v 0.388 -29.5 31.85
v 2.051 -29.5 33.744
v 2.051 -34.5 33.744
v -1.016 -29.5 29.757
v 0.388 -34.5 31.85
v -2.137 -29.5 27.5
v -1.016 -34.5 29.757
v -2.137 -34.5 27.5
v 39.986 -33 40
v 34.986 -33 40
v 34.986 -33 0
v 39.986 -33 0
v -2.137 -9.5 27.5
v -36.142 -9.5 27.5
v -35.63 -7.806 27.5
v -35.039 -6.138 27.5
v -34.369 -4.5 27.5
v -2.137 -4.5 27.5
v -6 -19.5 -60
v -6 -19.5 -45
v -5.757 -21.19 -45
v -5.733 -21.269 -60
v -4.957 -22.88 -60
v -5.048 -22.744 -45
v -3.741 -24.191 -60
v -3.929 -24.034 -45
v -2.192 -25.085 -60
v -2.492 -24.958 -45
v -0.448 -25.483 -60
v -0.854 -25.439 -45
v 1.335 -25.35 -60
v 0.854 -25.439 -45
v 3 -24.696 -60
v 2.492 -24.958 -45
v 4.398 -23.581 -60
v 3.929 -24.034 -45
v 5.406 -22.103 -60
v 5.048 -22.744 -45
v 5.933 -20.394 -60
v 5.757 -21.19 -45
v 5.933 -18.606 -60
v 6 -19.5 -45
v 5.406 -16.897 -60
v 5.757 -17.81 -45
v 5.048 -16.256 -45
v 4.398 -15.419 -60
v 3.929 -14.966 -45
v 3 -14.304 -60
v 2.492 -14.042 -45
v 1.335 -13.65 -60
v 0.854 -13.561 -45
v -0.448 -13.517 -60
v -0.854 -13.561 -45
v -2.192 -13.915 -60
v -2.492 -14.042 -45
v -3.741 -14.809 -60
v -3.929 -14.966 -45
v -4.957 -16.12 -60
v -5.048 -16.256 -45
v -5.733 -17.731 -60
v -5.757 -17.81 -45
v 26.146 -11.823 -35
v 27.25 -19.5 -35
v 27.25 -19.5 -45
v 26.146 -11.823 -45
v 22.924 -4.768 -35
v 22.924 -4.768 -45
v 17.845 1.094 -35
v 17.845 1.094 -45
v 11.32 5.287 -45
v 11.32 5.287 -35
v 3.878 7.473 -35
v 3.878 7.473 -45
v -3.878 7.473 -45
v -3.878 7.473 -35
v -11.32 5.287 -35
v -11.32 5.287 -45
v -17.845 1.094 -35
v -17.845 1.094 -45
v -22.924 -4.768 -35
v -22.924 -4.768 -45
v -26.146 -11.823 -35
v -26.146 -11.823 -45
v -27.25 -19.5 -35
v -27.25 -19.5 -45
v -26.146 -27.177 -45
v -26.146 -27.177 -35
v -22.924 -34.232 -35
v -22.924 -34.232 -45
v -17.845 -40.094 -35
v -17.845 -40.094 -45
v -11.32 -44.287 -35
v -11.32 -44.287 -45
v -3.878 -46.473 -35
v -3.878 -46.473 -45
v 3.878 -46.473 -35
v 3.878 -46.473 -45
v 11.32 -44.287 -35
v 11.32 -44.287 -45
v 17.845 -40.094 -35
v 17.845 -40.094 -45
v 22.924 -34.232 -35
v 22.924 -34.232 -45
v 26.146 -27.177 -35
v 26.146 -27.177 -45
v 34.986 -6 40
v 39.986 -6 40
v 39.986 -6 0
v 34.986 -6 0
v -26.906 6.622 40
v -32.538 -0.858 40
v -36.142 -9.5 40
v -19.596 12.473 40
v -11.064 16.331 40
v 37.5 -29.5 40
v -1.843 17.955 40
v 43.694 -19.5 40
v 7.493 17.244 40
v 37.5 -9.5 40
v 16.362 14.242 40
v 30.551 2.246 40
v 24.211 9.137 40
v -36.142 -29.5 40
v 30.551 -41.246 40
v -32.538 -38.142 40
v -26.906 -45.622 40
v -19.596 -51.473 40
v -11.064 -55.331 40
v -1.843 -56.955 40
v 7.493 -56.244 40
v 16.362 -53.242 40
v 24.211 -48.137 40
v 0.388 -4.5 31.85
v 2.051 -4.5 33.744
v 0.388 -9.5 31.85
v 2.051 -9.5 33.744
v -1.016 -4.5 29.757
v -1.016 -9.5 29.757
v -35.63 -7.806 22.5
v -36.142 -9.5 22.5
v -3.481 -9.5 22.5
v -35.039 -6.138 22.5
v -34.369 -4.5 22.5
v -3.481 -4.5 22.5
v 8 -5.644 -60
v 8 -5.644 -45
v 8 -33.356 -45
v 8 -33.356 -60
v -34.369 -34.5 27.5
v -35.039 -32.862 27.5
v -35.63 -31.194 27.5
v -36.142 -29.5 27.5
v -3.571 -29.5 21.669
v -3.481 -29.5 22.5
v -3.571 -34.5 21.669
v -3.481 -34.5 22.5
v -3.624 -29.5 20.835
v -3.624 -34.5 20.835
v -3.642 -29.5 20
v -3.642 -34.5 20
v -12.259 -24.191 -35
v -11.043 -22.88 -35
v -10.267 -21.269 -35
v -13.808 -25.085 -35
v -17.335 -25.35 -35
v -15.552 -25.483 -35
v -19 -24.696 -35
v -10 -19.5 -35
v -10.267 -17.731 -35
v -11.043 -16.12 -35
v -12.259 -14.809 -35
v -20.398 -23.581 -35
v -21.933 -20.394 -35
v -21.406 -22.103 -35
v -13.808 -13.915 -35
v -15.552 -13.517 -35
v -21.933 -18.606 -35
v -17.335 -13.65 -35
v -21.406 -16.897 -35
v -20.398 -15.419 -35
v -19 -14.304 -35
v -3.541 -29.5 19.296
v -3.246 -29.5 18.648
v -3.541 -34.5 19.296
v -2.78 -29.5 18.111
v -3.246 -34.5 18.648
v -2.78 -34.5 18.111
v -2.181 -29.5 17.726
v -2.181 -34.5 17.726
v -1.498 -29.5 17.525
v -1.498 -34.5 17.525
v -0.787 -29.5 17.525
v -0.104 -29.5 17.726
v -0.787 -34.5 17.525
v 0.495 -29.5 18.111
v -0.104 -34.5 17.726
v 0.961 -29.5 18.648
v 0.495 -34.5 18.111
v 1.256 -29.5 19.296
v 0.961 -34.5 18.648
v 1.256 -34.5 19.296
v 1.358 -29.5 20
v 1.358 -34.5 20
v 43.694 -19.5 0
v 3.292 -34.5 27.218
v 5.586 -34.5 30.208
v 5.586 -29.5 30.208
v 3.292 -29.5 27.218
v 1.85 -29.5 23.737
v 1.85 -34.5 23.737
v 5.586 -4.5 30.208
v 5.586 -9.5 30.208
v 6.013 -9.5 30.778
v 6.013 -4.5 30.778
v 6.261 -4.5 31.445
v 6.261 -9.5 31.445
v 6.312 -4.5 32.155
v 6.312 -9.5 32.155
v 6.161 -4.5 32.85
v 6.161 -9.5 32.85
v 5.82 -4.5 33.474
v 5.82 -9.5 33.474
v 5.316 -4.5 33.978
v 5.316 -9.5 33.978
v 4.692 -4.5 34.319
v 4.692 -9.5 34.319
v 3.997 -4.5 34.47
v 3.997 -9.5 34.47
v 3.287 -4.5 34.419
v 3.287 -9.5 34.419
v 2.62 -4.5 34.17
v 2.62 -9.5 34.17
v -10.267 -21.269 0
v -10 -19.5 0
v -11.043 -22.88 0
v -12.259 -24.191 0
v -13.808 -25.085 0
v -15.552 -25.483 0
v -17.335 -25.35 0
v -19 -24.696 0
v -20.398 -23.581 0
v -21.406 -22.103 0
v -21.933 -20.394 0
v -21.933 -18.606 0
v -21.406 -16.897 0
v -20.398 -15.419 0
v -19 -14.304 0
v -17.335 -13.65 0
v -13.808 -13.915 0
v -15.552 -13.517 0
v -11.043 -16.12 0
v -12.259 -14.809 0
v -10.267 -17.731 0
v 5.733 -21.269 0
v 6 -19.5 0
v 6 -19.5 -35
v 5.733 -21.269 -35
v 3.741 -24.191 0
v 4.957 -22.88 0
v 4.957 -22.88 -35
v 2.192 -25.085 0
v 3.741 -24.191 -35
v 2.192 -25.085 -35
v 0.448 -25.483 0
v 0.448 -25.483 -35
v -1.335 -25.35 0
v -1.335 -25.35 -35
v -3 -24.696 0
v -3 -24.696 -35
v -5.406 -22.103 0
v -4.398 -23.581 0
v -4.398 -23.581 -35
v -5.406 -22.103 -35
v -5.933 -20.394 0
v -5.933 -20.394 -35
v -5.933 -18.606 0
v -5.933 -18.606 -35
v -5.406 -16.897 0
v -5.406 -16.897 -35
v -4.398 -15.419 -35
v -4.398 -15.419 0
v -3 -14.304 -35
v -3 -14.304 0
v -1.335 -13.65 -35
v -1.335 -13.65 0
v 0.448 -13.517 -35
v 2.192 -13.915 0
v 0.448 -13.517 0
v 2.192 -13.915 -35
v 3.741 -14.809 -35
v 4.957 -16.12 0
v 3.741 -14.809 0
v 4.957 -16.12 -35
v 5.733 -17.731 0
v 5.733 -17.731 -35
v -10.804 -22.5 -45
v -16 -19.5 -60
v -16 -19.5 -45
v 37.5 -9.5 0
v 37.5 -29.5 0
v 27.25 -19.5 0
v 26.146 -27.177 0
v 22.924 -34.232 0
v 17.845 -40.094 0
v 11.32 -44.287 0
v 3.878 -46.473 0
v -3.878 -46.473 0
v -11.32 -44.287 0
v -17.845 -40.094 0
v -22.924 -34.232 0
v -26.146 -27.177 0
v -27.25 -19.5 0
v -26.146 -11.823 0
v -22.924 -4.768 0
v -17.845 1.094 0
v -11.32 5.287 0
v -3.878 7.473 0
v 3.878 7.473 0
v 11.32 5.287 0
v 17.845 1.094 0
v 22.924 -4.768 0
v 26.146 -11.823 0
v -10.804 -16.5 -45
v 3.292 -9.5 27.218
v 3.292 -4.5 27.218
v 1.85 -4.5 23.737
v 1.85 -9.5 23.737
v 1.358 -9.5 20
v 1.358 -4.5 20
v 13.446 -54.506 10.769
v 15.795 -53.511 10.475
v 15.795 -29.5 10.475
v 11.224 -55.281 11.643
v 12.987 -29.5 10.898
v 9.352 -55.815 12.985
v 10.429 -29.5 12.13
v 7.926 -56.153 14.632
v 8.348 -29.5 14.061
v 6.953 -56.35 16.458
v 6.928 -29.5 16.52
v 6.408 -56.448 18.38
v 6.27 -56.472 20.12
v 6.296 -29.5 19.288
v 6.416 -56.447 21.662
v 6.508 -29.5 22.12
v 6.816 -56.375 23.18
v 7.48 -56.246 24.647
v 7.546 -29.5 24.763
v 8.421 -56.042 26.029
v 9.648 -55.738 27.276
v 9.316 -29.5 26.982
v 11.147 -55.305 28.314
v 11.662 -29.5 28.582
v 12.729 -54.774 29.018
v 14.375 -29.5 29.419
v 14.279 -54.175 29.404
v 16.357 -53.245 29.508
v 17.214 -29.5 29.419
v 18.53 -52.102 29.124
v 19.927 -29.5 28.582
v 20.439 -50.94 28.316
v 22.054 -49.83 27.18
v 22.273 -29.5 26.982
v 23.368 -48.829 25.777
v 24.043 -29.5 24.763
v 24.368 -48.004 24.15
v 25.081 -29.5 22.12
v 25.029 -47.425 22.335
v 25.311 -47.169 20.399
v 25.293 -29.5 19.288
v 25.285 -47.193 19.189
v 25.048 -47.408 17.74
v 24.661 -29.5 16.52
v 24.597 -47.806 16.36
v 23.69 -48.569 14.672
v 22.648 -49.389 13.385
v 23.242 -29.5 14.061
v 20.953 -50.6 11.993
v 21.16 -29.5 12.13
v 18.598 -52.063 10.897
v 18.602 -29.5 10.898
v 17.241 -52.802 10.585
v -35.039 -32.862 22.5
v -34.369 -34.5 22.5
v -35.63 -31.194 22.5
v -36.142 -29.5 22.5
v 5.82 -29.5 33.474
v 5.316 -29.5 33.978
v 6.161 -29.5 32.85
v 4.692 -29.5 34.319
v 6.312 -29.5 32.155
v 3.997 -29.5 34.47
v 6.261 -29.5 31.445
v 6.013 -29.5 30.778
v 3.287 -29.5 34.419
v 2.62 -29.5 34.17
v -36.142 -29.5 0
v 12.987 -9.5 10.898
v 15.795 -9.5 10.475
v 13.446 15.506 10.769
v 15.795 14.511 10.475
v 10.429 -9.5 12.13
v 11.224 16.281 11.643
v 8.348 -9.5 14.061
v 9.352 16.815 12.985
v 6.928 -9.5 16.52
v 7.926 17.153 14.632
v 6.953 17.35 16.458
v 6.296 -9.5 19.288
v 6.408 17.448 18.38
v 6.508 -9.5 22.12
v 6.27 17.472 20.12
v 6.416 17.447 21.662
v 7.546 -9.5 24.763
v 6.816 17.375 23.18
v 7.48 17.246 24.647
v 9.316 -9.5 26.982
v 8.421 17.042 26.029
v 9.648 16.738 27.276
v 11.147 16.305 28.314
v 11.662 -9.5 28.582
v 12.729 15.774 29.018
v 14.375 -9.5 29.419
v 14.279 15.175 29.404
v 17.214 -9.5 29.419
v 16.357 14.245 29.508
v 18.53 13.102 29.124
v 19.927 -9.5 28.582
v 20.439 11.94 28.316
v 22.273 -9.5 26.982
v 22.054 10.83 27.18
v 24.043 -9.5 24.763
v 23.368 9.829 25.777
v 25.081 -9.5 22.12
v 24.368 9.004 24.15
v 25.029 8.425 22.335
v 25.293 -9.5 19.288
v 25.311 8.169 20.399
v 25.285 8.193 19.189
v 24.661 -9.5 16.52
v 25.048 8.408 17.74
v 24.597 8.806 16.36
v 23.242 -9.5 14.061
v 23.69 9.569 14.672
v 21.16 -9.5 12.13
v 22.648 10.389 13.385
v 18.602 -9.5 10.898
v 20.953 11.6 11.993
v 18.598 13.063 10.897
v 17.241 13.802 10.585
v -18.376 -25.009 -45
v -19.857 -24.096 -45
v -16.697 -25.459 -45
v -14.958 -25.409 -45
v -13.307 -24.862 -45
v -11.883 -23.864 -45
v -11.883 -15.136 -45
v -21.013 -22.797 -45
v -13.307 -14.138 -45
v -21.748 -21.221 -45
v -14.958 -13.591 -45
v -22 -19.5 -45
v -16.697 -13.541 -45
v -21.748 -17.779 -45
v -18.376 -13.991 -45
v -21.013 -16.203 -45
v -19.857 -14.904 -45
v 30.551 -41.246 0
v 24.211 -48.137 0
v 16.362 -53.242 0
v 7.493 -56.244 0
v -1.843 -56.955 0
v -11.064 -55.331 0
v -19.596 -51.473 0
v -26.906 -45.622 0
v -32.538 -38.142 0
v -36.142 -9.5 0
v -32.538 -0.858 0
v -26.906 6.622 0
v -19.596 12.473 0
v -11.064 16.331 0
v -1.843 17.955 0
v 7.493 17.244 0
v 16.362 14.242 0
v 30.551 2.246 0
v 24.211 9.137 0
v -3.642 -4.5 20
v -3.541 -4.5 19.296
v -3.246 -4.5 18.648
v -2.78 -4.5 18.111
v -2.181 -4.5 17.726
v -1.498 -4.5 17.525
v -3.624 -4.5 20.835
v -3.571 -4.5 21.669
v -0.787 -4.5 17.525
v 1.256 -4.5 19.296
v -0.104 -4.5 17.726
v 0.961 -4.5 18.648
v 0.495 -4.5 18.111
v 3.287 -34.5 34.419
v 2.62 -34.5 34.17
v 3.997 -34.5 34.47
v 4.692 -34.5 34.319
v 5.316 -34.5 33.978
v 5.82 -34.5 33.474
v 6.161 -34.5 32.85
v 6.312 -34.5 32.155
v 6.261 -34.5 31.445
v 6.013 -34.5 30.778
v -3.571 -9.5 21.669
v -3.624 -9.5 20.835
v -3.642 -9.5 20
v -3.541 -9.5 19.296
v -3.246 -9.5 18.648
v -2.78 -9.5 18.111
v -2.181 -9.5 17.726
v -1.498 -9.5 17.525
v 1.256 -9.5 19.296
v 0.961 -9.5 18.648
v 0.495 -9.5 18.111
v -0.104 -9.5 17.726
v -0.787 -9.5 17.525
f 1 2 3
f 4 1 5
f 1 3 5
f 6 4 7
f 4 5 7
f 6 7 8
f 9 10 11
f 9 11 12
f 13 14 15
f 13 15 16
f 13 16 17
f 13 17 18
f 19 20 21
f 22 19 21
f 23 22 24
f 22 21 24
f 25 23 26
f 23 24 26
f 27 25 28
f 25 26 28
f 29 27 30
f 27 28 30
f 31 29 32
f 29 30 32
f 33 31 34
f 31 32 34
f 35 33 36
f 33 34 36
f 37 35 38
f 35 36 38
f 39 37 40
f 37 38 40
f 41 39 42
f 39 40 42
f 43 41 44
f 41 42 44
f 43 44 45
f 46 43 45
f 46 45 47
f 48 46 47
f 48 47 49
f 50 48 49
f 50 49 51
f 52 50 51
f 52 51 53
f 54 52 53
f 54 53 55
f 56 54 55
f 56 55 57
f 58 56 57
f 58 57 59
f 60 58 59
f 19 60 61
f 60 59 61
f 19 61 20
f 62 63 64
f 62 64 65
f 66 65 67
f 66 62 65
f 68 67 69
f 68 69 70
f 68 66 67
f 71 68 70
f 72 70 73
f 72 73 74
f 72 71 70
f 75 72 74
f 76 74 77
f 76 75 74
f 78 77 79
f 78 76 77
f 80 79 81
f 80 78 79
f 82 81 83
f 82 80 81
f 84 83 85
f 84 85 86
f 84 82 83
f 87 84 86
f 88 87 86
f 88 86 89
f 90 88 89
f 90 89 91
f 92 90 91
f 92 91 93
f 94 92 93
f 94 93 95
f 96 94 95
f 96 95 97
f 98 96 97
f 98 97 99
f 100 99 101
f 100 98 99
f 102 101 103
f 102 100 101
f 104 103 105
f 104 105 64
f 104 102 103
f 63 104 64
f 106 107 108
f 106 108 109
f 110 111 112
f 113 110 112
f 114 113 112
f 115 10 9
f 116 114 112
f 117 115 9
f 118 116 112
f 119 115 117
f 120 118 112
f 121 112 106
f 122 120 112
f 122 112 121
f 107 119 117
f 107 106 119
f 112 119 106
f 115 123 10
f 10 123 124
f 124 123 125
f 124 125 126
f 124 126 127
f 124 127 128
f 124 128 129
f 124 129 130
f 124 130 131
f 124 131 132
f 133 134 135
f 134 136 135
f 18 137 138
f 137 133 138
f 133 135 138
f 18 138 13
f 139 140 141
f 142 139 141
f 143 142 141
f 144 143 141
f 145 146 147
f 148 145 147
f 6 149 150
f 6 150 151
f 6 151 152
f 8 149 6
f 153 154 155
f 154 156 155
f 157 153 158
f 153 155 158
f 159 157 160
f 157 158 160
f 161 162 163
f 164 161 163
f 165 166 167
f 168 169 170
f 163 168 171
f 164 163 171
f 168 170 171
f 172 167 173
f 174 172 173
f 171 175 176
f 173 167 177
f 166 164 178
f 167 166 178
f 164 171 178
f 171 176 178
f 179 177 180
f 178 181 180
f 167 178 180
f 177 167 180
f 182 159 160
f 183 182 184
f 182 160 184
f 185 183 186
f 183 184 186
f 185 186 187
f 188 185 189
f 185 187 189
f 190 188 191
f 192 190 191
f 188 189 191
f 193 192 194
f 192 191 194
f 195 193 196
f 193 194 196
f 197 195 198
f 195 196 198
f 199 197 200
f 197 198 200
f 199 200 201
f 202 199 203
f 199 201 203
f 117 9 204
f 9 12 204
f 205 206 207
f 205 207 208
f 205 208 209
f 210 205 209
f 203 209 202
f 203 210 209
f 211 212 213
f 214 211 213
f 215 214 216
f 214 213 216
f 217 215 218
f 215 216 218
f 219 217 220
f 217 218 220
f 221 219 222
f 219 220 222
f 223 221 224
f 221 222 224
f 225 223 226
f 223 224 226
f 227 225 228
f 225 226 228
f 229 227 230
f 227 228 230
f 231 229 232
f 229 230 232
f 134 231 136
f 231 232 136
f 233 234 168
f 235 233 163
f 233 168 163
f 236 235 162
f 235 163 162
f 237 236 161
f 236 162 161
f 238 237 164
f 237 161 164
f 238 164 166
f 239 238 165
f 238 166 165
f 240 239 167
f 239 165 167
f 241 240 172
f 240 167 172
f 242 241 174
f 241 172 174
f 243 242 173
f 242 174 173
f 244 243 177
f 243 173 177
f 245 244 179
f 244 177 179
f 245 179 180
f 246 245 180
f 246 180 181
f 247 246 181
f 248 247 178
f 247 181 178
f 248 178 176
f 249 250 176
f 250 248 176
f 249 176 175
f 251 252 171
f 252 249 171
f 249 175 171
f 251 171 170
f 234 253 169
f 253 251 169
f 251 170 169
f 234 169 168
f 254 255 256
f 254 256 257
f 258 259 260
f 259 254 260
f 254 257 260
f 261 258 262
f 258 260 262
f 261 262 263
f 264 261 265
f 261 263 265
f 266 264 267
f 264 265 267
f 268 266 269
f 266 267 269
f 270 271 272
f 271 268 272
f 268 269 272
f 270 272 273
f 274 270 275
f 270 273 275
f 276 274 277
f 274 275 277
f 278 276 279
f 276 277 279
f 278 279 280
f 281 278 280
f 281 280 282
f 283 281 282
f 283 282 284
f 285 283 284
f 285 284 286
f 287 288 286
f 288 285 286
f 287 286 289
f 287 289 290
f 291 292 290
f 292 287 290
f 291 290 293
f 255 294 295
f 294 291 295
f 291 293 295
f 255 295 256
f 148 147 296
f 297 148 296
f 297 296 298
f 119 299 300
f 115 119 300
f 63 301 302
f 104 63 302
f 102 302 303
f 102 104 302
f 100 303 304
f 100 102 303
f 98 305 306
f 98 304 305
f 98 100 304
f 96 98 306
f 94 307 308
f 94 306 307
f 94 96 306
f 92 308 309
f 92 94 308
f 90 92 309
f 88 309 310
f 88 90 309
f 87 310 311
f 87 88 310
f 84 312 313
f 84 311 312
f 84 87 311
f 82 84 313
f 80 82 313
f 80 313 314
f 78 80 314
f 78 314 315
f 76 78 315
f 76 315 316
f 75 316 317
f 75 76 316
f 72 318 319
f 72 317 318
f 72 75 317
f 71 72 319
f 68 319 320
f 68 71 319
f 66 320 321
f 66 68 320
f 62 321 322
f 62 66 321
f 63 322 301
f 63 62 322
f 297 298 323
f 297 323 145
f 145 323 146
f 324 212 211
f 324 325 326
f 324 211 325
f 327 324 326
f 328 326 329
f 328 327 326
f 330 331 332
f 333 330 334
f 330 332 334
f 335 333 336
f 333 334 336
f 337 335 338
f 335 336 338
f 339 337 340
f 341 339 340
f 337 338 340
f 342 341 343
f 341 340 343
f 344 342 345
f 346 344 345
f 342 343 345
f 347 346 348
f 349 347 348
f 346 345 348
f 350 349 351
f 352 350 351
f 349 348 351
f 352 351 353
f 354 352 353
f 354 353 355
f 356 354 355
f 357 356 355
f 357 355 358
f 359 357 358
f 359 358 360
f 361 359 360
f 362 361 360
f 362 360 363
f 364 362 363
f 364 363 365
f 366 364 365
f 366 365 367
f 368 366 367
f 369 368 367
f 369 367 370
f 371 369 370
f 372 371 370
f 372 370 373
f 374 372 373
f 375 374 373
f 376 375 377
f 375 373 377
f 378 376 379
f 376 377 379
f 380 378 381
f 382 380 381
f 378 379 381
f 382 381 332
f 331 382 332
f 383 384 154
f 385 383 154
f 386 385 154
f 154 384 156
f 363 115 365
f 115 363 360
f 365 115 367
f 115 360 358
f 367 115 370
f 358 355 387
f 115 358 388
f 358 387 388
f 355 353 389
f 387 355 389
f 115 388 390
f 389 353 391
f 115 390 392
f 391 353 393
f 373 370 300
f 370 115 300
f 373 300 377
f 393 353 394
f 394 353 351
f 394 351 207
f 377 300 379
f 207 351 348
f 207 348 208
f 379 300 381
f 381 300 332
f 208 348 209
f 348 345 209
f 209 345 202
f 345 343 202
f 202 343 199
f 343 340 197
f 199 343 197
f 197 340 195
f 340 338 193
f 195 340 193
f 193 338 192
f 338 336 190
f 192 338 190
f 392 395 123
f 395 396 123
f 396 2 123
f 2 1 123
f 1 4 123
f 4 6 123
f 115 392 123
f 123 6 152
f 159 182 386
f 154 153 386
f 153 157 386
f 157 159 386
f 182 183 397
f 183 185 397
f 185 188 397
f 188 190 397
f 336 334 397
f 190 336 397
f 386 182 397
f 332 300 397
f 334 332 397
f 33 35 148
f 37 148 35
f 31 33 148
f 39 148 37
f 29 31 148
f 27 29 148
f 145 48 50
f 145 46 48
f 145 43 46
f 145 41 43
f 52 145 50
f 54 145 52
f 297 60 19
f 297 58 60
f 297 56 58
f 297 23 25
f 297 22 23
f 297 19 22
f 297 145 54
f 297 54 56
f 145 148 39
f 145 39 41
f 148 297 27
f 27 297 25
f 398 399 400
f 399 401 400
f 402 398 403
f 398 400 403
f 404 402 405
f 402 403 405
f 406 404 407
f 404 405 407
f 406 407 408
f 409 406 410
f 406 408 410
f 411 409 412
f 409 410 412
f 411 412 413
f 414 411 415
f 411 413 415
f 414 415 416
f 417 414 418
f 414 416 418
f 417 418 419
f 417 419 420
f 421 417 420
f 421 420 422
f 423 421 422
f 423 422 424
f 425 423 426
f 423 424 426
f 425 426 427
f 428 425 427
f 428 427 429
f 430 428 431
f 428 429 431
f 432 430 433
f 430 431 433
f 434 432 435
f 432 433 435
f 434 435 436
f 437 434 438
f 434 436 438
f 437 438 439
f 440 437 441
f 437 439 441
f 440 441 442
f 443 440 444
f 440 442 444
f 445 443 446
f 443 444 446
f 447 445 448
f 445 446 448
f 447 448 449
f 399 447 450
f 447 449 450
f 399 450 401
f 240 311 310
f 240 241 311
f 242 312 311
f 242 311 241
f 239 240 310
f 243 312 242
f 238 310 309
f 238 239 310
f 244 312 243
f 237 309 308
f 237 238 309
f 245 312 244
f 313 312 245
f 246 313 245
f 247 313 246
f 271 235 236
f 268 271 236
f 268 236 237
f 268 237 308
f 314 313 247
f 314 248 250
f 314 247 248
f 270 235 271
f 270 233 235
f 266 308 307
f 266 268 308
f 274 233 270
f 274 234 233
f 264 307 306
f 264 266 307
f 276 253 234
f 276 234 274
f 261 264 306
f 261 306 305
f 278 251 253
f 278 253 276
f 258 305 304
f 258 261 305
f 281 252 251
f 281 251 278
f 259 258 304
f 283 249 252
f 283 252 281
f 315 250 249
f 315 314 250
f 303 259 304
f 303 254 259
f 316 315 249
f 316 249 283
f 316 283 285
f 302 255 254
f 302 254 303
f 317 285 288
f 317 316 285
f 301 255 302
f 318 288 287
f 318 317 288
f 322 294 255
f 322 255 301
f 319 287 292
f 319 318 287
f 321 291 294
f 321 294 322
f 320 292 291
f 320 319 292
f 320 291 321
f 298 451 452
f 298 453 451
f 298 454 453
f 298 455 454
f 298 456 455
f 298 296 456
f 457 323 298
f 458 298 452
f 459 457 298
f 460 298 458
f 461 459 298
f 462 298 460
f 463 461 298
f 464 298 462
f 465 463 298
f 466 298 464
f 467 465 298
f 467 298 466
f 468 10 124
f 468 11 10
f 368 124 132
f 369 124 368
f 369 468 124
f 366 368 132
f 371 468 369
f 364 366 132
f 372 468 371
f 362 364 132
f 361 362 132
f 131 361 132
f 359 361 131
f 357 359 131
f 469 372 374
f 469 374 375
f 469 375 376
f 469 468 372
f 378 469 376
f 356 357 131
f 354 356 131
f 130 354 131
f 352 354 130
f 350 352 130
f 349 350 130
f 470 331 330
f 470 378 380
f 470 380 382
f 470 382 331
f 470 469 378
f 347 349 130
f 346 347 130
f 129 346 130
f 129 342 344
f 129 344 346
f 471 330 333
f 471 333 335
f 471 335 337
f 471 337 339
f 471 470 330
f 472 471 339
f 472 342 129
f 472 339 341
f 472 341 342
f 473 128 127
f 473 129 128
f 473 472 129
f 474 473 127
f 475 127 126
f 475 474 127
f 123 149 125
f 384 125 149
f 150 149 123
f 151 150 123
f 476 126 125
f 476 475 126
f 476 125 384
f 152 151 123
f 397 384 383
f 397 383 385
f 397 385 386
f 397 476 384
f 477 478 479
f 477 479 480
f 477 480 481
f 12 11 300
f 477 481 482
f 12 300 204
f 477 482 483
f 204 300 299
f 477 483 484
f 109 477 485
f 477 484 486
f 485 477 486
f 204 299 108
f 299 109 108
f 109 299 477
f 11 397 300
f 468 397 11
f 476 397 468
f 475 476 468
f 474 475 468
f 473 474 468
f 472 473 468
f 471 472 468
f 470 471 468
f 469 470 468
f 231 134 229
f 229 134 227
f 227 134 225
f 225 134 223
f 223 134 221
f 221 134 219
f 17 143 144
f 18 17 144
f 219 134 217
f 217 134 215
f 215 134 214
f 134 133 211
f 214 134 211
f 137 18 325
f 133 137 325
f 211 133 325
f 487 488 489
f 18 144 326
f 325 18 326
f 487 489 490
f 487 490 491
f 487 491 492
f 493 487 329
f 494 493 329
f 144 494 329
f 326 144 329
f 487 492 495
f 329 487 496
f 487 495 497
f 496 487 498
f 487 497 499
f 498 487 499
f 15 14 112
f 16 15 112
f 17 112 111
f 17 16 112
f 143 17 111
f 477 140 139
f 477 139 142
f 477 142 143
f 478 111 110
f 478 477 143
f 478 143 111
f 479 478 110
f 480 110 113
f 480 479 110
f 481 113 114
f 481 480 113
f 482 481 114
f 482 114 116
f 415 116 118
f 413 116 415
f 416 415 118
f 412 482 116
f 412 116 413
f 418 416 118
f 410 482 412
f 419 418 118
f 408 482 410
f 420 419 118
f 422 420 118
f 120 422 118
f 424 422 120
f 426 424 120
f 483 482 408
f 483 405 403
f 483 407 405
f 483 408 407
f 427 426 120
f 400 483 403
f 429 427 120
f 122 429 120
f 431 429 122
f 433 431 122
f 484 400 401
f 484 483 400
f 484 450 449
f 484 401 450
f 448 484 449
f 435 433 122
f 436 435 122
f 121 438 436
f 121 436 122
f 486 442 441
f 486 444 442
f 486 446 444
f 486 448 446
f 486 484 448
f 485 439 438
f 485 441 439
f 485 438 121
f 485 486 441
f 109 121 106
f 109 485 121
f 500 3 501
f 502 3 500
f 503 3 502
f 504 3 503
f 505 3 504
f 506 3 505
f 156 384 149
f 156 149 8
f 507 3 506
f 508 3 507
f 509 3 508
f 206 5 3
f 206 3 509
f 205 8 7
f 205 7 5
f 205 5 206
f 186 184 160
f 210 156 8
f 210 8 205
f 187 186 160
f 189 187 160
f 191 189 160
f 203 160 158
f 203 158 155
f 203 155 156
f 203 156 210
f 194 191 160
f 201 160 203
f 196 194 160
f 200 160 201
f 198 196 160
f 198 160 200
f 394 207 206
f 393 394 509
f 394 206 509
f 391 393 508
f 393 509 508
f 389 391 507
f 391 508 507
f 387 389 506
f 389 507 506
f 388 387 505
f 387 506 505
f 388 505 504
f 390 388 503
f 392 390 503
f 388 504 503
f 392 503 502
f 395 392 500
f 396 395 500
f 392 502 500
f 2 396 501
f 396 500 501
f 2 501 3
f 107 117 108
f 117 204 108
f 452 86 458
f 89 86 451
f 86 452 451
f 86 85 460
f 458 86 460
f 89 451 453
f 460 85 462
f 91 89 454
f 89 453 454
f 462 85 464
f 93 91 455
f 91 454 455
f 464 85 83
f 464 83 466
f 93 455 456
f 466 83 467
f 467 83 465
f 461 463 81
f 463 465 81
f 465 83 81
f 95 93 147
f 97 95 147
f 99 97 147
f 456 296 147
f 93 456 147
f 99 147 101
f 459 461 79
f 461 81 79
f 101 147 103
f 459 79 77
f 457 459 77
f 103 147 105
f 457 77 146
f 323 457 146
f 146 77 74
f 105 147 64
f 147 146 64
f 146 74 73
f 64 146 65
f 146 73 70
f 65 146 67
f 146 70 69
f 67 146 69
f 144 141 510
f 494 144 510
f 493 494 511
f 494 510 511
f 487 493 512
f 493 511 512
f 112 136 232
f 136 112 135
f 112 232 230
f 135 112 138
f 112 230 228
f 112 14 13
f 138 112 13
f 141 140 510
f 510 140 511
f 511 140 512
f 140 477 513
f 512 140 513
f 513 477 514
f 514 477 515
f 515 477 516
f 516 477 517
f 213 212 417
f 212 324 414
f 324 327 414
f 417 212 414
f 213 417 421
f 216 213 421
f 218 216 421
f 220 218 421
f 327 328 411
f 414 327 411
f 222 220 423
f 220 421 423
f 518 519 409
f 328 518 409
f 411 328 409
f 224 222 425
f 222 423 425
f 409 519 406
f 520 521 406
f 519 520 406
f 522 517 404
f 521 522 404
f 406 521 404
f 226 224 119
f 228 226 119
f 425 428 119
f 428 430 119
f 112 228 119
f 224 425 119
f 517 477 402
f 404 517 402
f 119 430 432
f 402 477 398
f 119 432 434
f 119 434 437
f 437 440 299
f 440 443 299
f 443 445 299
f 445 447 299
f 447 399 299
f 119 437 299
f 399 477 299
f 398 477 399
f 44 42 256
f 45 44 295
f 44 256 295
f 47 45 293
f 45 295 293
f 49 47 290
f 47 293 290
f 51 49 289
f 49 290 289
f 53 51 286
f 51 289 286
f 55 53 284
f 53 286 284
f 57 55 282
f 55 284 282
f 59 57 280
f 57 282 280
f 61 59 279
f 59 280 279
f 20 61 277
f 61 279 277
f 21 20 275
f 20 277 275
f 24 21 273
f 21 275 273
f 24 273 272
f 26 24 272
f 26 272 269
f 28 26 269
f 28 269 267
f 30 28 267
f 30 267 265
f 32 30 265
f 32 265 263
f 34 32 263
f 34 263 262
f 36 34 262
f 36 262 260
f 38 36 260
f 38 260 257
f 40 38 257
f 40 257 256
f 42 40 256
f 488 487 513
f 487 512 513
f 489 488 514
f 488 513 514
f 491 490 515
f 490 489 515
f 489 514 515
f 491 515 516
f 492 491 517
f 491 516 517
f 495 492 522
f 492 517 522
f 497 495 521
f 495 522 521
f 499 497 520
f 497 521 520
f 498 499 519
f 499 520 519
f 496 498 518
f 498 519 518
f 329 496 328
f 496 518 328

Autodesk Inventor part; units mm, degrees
ref_plane "YZ Plane" through (0, 0, 0) normal (1, 0, 0) x (0, 1, 0)
ref_plane "XZ Plane" through (0, 0, 0) normal (0, 1, 0) x (-1, 0, 0)
ref_plane "XY Plane" through (0, 0, 0) normal (0, 0, 1) x (1, 0, 0)
ref_plane "Work Plane1" through (-35, 22.5, -35) normal (0, 0, 1) x (1, 0, 0)
sketch "Sketch1" plane through (-35, 22.5, -35) normal (0, 0, 1) x (1, 0, 0)
  circle A0 centre (35, -42) radius 27.25
  circle A1 centre (35, -42) radius 6
  circle A2 centre (19, -42) radius 6
  dimension "d0" = 54.5
  dimension "d24" = 12
  dimension "d70" = 12
  dimension "d71" = 16
ref_plane "Work Plane2" through (0, -19.5, 0) normal (0, 0, 1) x (1, 0, 0)
sketch "Sketch2" plane through (0, -19.5, 0) normal (0, 0, 1) x (1, 0, 0)
  arc A0 (-36.1421, -10) -> (-36.1421, 10) centre (0, 0) ccw
  line L0 (37.5, -10) -> (-36.1421, -10)
  line L1 (-36.1421, 10) -> (37.5, 10)
  line L2 (37.5, 10) -> (37.5, -10)
  line L3 (34.9857, -13.5) -> (39.9857, -13.5)
  line L4 (39.9857, -13.5) -> (39.9857, 13.5)
  line L5 (39.9857, 13.5) -> (34.9857, 13.5)
  line L6 (34.9857, 13.5) -> (34.9857, -13.5)
  line L7 (39.9857, -13.5) -> (43.6938, 0)
  line L8 (43.6938, 0) -> (39.9857, 13.5)
  point P0 (0, 19.5)
  point P1 (37.5, 0)
  point P2 (36.1421, 10)
  point P3 (36.1421, -10)
  dimension "d3" = 75
  dimension "d40" = 5
  dimension "d41" = 27
  dimension "d44" = 14
extrude "Extrusion2" add sketch "Sketch2" along normal blind 40 contours L0 L6 A0 | L6 L0 A0 | A0 L0 L2 L1 L5 L4 L3 | L4 L8 L7 | L6 A0 L1 | L1 A0 L6
ref_plane "Work Plane3" through (-36.1421, -9.5, 0) normal (0, -1, 0) x (1, 0, 0)
sketch "Sketch4" plane through (-36.1421, -9.5, 0) normal (0, -1, 0) x (1, 0, 0)
  line L0 (0, 0) -> (10.5247, 0) projected
  point P0 (36.1421, 0)
  point P1 (51.9367, 20)
hole "Hole2" at (15.7946, -9.5, 20) direction (0, 1, 0) diameter 19.05 end through all both
extrude "Extrusion3" add sketch "Sketch1" along normal blind 35 and the other way blind 10
sketch "Sketch8" plane through (0, -19.5, -45) normal (0, 0, -1) x (-1, 0, 0)
  circle A0 centre (0, 0) radius 6 projected
  circle A1 centre (0, 0) radius 6 projected
  line L0 (-6, 10.3923) -> (12, 0)
  line L1 (12, 0) -> (-6, -10.3923)
  line L2 (-6, -10.3923) -> (-6, 10.3923)
  line L3 (-8, -13.8564) -> (16, 0)
  line L4 (16, 0) -> (-8, 13.8564)
  line L5 (-8, 13.8564) -> (-8, -13.8564)
  point P0 (0, 19.5)
  point P1 (-6, 0)
  point P2 (-6, 0)
  point P3 (3, -5.1962)
  point P4 (3, 5.1962)
  dimension "d69" = 2
extrude "Extrusion5" add sketch "Sketch8" along normal blind 15 contours A0 L0 L1 | A0 L2 L0 | L1 L2 A0 | L5 L4 L3
ref_plane "Work Plane4" through (-35, 22.5, 0) normal (0, 0, 1) x (1, 0, 0)
split body "Split1" result two bodies by plane through (-35, 22.5, 0) normal (0, 0, 1) first body at (28.9114, 3.5897, 20.1633)
sketch "Sketch11" plane through (0, -19.5, -45) normal (0, 0, -1) x (-1, 0, 0)
  arc A0 (10.8038, -3) -> (10.8038, 3) centre (16, 0) ccw projected
  arc A1 (10.8038, 3) -> (10.8038, -3) centre (16, 0) ccw projected
extrude "Extrusion8" add sketch "Sketch11" against normal blind 10 bodies 3
sketch "Sketch13" plane through (-36.1421, -29.5, 0) normal (0, 1, 0) x (1, 0, 0)
  line L0 (40, -20) -> (40, -20)
  circle A0 centre (51.9367, -20) radius 9.525 projected
  line L1 (0, 0) -> (0, -40) projected
  line L2 (0, -22.5) -> (32.6611, -22.5)
  arc A1 (37.4997, -20) -> (41.7282, -30.2085) centre (51.9367, -20) ccw
  line L3 (51.9367, -20) -> (41.7282, -30.2085) construction
  line L4 (51.9367, -20) -> (37.4997, -20) construction
  arc A2 (38.1927, -33.744) -> (41.7282, -30.2085) centre (39.9604, -31.9763) ccw
  arc A3 (0, -22.5) -> (0, -27.5) centre (0, -25) ccw
  line L5 (0, -27.5) -> (34.005, -27.5)
  arc A4 (32.4997, -20) -> (32.6611, -22.5) centre (51.9367, -20) ccw
  arc A5 (34.005, -27.5) -> (38.1927, -33.744) centre (51.9367, -20) ccw
  arc A6 (37.4997, -20) -> (32.4997, -20) centre (34.9997, -20) ccw
  point P0 (36.1421, 0)
  dimension "d62" = 45
  dimension "d82" = 14.437
  dimension "d83" = 5
  dimension "d84" = 45
  dimension "d85" = 2.5
  dimension "d86" = 2.5
extrude "Extrusion9" cut sketch "Sketch13" along normal blind 25 and the other way blind 5 contours L2 A4 A6 A1 A2 A5 L5 L1 | L1 A3 bodies 2
properties part number "handle_base"
